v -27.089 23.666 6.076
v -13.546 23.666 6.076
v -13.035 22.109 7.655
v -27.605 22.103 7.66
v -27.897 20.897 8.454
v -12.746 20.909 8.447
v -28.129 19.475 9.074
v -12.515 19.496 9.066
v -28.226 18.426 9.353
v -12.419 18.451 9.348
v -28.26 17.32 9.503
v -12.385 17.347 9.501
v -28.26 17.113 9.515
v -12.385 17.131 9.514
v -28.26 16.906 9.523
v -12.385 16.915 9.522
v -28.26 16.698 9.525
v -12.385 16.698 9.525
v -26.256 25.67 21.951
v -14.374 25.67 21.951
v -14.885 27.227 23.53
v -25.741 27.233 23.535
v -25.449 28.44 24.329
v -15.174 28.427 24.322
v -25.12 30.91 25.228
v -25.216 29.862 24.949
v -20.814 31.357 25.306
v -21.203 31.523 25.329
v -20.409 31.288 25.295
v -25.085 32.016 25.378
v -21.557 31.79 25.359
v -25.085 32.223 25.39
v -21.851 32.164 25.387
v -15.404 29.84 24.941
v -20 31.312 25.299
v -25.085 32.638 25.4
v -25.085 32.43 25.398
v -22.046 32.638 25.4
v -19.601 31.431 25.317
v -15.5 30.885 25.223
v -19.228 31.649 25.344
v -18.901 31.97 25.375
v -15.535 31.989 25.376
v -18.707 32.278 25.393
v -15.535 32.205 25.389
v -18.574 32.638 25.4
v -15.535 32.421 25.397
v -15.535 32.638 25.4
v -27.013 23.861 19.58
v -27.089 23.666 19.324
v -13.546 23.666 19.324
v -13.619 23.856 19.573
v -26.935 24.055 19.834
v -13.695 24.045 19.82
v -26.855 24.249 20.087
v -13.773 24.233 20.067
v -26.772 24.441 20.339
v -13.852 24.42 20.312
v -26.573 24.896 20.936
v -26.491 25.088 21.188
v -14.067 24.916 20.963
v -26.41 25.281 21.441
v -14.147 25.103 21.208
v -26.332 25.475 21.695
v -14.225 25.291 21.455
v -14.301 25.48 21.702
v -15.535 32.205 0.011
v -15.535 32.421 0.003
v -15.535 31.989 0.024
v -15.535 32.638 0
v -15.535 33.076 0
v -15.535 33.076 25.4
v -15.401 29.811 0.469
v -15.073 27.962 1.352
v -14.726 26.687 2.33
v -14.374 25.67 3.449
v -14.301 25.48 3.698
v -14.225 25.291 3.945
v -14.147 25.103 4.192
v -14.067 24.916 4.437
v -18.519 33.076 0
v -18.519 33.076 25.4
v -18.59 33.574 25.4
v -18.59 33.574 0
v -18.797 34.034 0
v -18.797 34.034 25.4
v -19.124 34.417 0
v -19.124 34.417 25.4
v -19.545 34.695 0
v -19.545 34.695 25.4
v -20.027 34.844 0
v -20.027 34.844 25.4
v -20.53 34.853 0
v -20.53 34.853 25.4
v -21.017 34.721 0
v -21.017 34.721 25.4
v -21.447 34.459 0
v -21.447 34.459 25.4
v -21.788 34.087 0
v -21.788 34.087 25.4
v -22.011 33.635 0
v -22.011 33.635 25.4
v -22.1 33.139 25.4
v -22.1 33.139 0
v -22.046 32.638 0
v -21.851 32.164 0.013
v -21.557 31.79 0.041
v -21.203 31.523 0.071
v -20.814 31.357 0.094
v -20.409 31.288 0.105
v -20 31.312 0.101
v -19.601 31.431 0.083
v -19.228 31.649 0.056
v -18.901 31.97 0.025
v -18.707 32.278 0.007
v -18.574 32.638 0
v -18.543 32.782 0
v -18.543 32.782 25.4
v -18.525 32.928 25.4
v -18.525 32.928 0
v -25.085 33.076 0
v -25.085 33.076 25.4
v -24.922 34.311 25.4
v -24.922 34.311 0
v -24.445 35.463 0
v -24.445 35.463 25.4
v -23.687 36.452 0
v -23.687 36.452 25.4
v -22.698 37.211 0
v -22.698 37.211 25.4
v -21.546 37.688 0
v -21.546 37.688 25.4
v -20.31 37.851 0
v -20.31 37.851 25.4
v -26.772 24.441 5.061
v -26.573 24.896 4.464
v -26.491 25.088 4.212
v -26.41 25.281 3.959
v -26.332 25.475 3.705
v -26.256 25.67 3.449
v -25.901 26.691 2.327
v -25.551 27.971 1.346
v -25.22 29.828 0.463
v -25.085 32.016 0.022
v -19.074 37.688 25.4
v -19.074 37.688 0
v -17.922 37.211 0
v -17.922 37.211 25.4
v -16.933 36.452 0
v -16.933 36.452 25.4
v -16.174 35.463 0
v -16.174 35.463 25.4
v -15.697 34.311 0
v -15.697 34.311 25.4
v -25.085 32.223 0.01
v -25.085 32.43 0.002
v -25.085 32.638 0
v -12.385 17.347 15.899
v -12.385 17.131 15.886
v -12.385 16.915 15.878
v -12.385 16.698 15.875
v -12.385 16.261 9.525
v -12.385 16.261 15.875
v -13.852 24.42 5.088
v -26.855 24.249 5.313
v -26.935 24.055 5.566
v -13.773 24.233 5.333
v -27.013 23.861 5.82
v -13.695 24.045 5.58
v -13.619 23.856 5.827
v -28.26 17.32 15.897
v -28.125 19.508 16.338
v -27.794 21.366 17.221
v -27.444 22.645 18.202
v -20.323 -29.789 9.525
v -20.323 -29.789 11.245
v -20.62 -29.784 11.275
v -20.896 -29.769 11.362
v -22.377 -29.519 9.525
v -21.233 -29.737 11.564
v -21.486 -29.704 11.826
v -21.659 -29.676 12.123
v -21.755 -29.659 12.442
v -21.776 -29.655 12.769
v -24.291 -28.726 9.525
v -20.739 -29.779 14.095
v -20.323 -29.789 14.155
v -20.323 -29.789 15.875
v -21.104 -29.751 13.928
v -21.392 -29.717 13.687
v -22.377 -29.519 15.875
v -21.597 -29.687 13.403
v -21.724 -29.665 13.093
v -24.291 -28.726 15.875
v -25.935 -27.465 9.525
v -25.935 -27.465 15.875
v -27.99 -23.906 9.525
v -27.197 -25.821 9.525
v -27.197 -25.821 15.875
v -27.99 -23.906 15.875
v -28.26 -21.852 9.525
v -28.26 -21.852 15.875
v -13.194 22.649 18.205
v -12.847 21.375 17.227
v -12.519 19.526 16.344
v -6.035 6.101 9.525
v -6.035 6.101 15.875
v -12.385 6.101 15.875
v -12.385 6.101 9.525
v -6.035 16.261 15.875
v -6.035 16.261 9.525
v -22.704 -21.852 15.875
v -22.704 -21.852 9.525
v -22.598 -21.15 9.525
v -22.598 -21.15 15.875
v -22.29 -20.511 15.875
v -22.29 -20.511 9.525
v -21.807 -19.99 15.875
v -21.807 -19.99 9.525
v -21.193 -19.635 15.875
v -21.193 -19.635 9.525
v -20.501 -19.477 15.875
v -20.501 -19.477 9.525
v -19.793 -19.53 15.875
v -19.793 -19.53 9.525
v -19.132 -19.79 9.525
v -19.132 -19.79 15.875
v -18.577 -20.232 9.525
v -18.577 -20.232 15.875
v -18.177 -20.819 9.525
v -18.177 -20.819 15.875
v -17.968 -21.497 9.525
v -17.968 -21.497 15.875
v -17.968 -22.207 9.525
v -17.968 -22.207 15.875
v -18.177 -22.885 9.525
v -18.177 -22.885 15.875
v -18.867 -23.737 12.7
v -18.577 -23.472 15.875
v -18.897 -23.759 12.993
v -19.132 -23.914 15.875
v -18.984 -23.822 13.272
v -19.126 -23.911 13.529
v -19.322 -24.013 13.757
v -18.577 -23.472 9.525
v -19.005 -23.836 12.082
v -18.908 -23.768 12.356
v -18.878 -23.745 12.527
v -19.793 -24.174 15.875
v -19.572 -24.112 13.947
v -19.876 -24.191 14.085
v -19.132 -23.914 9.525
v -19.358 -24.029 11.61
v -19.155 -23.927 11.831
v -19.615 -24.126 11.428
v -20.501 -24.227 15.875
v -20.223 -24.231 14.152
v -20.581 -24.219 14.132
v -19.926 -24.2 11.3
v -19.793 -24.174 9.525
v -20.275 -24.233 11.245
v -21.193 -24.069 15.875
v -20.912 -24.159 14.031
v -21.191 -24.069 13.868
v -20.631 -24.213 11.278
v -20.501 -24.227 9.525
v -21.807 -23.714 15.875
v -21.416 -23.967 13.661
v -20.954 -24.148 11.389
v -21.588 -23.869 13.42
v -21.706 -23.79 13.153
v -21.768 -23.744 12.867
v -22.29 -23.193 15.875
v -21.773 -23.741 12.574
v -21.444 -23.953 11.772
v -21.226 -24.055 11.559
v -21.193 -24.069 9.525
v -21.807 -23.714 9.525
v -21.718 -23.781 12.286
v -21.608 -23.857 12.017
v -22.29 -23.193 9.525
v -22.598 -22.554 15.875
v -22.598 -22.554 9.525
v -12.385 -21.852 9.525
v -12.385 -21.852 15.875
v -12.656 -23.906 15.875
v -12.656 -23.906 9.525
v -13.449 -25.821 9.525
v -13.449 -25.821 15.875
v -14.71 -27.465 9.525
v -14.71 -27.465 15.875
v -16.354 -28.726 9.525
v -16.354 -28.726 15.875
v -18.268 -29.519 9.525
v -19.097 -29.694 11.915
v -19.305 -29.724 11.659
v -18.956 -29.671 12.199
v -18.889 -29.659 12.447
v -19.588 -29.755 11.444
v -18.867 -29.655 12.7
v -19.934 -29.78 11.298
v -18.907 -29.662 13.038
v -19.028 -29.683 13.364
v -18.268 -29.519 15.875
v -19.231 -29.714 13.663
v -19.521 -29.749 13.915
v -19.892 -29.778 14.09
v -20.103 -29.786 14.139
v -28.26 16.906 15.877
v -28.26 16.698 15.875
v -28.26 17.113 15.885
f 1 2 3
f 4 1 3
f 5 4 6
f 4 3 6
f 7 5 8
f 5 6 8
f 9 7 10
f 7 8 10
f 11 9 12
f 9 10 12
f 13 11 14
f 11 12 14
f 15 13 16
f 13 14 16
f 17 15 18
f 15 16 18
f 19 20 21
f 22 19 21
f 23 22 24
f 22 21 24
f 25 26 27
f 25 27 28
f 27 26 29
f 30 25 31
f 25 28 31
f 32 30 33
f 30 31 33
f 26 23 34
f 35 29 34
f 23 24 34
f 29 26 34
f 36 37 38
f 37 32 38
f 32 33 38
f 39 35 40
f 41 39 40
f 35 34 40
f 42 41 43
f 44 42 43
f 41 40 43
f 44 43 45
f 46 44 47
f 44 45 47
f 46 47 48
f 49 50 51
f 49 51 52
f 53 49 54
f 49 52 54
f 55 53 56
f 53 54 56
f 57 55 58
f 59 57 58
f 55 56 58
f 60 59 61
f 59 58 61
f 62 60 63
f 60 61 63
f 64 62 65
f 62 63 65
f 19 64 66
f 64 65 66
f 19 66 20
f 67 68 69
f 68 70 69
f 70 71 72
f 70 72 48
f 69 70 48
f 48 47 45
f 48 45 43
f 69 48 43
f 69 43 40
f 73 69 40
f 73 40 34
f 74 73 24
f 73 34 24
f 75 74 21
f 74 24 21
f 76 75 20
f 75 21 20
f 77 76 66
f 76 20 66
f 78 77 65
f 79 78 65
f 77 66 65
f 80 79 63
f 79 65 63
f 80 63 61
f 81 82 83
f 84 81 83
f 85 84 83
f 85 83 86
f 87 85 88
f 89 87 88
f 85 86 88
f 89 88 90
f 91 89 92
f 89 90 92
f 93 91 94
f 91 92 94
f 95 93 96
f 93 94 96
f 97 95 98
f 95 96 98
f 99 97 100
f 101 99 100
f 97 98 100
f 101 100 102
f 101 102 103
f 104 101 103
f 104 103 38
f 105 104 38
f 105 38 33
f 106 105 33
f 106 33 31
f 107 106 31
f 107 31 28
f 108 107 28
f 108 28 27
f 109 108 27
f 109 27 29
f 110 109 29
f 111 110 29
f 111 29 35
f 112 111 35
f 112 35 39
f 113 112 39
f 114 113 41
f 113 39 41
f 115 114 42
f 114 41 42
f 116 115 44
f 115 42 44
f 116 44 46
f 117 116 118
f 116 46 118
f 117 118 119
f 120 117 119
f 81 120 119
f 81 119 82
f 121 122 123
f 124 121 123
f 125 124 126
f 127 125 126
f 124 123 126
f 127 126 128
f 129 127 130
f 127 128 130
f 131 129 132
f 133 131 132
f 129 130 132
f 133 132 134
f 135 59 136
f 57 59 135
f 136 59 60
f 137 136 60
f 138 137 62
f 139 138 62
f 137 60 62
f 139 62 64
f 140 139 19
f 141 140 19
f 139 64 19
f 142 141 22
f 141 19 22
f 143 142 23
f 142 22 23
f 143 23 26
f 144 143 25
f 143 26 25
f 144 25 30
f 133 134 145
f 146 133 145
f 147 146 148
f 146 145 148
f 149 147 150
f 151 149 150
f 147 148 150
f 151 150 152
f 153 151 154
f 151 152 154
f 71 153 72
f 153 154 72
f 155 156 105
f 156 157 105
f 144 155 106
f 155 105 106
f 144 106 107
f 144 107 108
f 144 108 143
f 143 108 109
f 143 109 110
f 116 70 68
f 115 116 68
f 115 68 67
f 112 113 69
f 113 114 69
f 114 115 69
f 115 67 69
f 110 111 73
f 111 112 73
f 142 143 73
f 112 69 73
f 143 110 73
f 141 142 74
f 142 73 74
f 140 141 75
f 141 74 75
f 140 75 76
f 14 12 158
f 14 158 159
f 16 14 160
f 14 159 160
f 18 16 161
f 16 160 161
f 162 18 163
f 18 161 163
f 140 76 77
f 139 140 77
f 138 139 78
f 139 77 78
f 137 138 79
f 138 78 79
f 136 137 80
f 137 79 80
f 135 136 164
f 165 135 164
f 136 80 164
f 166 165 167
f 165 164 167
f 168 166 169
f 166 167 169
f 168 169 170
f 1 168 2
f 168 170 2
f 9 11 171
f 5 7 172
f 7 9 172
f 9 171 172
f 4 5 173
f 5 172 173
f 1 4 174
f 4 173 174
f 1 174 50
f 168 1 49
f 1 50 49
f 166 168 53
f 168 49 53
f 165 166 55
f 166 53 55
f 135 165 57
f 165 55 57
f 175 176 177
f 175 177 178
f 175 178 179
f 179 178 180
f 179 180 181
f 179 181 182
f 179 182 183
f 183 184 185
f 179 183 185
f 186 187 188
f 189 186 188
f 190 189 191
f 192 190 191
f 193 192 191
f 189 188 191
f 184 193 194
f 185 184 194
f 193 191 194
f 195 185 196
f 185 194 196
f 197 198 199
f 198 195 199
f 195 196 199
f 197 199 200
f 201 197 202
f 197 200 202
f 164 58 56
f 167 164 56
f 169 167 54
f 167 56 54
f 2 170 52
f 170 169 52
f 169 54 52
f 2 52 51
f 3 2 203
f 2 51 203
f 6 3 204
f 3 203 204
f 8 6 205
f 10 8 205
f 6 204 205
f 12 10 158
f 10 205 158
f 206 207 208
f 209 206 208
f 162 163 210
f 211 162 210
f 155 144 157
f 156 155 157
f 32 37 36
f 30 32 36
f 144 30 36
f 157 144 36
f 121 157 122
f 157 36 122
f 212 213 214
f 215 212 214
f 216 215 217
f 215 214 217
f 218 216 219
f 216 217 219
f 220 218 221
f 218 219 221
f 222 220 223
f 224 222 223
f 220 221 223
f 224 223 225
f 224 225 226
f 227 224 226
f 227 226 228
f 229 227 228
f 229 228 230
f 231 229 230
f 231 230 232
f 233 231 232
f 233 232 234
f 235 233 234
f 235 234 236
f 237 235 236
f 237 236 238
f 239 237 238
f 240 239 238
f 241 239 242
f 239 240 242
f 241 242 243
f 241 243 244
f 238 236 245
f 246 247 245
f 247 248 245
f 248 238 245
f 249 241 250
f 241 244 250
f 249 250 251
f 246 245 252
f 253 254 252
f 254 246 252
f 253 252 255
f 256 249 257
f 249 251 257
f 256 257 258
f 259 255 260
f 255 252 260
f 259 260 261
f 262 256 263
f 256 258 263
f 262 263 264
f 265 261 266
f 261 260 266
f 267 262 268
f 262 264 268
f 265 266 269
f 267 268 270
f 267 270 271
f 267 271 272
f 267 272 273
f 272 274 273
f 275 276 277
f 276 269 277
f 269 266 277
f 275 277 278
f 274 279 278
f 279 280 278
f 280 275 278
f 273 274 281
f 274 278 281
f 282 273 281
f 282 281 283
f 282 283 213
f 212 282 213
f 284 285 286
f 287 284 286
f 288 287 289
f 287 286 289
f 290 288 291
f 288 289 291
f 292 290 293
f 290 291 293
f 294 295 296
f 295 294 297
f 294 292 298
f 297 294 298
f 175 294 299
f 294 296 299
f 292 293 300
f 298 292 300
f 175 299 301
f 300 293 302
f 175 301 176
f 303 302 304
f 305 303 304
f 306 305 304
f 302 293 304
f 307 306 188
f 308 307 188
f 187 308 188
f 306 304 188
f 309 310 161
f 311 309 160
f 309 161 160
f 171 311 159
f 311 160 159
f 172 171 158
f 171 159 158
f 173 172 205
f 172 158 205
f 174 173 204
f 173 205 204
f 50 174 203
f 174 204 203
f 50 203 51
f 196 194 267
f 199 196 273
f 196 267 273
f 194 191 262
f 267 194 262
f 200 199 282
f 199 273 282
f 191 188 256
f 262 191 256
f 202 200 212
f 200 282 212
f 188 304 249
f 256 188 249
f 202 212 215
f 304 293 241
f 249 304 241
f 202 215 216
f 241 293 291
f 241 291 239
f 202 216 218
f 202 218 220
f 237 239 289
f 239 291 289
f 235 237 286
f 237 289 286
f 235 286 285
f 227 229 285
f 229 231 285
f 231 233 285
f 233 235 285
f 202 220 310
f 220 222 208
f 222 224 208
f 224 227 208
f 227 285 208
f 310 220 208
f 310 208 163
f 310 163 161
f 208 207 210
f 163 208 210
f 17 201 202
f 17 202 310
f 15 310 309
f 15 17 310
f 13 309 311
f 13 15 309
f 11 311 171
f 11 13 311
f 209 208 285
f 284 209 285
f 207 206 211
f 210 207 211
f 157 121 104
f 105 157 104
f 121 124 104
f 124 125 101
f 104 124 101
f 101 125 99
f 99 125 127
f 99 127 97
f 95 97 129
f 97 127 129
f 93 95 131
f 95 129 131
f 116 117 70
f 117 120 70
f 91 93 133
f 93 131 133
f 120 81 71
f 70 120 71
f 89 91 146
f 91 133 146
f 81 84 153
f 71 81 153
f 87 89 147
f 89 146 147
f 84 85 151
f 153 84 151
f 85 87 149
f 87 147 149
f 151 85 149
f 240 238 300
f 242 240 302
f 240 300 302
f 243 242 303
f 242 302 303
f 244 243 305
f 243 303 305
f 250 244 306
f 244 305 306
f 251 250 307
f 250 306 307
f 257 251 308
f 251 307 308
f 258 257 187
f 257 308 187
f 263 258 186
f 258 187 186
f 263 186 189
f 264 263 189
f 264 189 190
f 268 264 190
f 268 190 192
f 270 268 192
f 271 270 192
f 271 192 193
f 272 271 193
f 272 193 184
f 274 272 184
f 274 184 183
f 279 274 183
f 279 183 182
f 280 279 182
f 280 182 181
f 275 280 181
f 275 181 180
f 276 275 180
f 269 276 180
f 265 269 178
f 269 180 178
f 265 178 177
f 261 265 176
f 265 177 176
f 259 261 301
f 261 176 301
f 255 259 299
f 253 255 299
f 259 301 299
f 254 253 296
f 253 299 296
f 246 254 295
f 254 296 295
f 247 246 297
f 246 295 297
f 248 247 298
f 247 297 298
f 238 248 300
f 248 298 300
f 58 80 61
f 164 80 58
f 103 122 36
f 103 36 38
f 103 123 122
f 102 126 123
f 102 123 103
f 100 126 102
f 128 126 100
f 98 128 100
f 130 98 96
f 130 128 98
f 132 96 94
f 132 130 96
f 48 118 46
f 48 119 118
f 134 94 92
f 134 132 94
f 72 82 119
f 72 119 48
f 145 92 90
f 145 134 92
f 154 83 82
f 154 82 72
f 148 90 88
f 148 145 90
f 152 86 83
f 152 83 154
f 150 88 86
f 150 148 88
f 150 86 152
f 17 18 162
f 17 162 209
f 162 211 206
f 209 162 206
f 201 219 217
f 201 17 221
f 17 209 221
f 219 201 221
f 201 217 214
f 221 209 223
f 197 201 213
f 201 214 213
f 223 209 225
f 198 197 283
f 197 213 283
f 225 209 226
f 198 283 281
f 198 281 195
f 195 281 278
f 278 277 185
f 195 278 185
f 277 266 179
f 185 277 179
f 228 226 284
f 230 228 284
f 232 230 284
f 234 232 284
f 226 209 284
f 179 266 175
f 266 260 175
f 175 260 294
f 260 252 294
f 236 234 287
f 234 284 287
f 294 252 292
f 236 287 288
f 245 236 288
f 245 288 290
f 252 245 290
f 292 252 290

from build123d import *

# Parameters (mm, degrees)
SKETCH1_W               = 22.225
SKETCH1_H               = 67.6402
BOSS_EXTRUDE1_DEPTH     = 25.4
SKETCH2_R               = 1.7907
CUT_EXTRUDE2_DEPTH      = 25.4
SKETCH4_W               = 9.525
SKETCH4_H               = 10.16
SKETCH4_H_2             = 35.894850391
SKETCH4_H_3             = 35.916644849
CUT_EXTRUDE3_DEPTH      = 51.712797865
SKETCH5_R               = 2.38125
CUT_EXTRUDE4_DEPTH      = 6.35
CUT_EXTRUDE5_REACH      = 79.582
CUT_EXTRUDE5_END_RADIUS = 2.38125
SKETCH6_R               = 1.455475959


with BuildPart() as part:
    # Sketch1 → Boss-Extrude1 (new body)
    with BuildSketch(Plane.XY):
        with Locations((-17.147623967, 4.03062314)):
            Rectangle(SKETCH1_W, SKETCH1_H)
    extrude(amount=BOSS_EXTRUDE1_DEPTH)

    # Sketch2 → Cut-Extrude2 (cut)
    with BuildSketch(Plane.XY.offset(25.4)):
        with BuildLine():
            ThreePointArc((-20.309923967, 37.85072314), (-16.933347665, 36.452099442), (-15.534723967, 33.07552314))
            Line((-15.534723967, 33.07552314), (-15.534723967, 31.988846816))
            ThreePointArc((-15.534723967, 31.988846816), (-15.164047916, 28.377221194), (-14.067475414, 24.916185349))
            Line((-14.067475414, 24.916185349), (-13.85237252, 24.420060932))
            ThreePointArc((-13.85237252, 24.420060932), (-12.755800018, 20.959025087), (-12.385123967, 17.347399465))
            Line((-12.385123967, 17.347399465), (-12.385123967, 16.26072314))
            Line((-12.385123967, 16.26072314), (-6.035123967, 16.26072314))
            Line((-6.035123967, 16.26072314), (-6.035123967, 37.85072314))
            Line((-6.035123967, 37.85072314), (-20.309923967, 37.85072314))
        make_face()
        with BuildLine():
            Line((-25.085123967, 32.016111722), (-25.085123967, 33.07552314))
            ThreePointArc((-25.085123967, 33.07552314), (-23.686500268, 36.452099442), (-20.309923967, 37.85072314))
            Line((-20.309923967, 37.85072314), (-28.260123967, 37.85072314))
            Line((-28.260123967, 37.85072314), (-28.260123967, 17.320134559))
            ThreePointArc((-28.260123967, 17.320134559), (-27.884120973, 20.957343409), (-26.772015056, 24.440716329))
            Line((-26.772015056, 24.440716329), (-26.573232878, 24.895529952))
            ThreePointArc((-26.573232878, 24.895529952), (-25.461126961, 28.378902872), (-25.085123967, 32.016111722))
        make_face()
        with BuildLine():
            Line((-6.035123967, -29.78947686), (-6.035123967, 6.10072314))
            Line((-6.035123967, 6.10072314), (-12.385123967, 6.10072314))
            Line((-12.385123967, 6.10072314), (-12.385123967, -21.85197686))
            ThreePointArc((-12.385123967, -21.85197686), (-14.709963891, -27.464636935), (-20.322623967, -29.78947686))
            Line((-20.322623967, -29.78947686), (-6.035123967, -29.78947686))
        make_face()
        with BuildLine():
            ThreePointArc((-20.322623967, -29.78947686), (-25.935284043, -27.464636935), (-28.260123967, -21.85197686))
            Line((-28.260123967, -21.85197686), (-28.260123967, -29.78947686))
            Line((-28.260123967, -29.78947686), (-20.322623967, -29.78947686))
        make_face()
        with Locations((-20.309923967, 33.07552314)):
            Circle(SKETCH2_R)
    extrude(amount=-CUT_EXTRUDE2_DEPTH, mode=Mode.SUBTRACT)

    # Sketch4 → Cut-Extrude3 (cut, through all)
    with BuildSketch(Plane(origin=(-6.035123967, 0, 0), x_dir=(0, 0, -1), z_dir=(1, 0, 0))):
        with BuildLine():
            Line((-9.525, 16.698464592), (-9.525, 16.26072314))
            Line((-9.525, 16.26072314), (0, 16.26072314))
            Line((0, 16.26072314), (0, 32.637781689))
            ThreePointArc((0, 32.637781689), (-0.909409772, 28.750457477), (-3.448884978, 25.669973531))
            Line((-3.448884978, 25.669973531), (-6.076115022, 23.66627275))
            ThreePointArc((-6.076115022, 23.66627275), (-8.615590228, 20.585788804), (-9.525, 16.698464592))
        make_face()
        with Locations((-4.7625, 11.18072314)):
            Rectangle(SKETCH4_W, SKETCH4_H)
        with Locations((-4.7625, -11.846702056)):
            Rectangle(SKETCH4_W, SKETCH4_H_2)
        with Locations((-20.6375, -11.857599285)):
            Rectangle(SKETCH4_W, SKETCH4_H_3)
        with Locations((-20.6375, 11.18072314)):
            Rectangle(SKETCH4_W, SKETCH4_H)
        with BuildLine():
            Line((-25.4, 16.26072314), (-15.875, 16.26072314))
            Line((-15.875, 16.26072314), (-15.875, 16.698464592))
            ThreePointArc((-15.875, 16.698464592), (-16.784409772, 20.585788804), (-19.323884978, 23.66627275))
            Line((-19.323884978, 23.66627275), (-21.951115022, 25.669973531))
            ThreePointArc((-21.951115022, 25.669973531), (-24.490590228, 28.750457477), (-25.4, 32.637781689))
            Line((-25.4, 32.637781689), (-25.4, 16.26072314))
        make_face()
    extrude(amount=-CUT_EXTRUDE3_DEPTH, mode=Mode.SUBTRACT)

    # Sketch5 → Cut-Extrude4 (cut)
    with BuildSketch(Plane(origin=(0, 0, 9.525), x_dir=(-1, 0, 0), z_dir=(0, 0, -1))):
        with Locations((20.322623967, -21.85197686)):
            Circle(SKETCH5_R)
    extrude(amount=-CUT_EXTRUDE4_DEPTH, mode=Mode.SUBTRACT)

    # Cut-Extrude5: up to this cylinder (the profile starts outside it)
    cut_extrude5_end = Plane(origin=(-20.322623967, -21.85197686, 12.7), z_dir=(0, 0, -1)) * Cylinder(CUT_EXTRUDE5_END_RADIUS, 164.9265, mode=Mode.PRIVATE)
    # Sketch6 → Cut-Extrude5 (cut, up to the surface)
    with BuildSketch(Plane.XZ.offset(29.78947686), mode=Mode.PRIVATE) as cut_extrude5_sk1:
        with Locations((-20.322623967, 12.7)):
            Circle(SKETCH6_R)
    cut_extrude5_tool1 = extrude(cut_extrude5_sk1.sketch, amount=-CUT_EXTRUDE5_REACH, mode=Mode.PRIVATE) - cut_extrude5_end
    add(cut_extrude5_tool1.solids().sort_by_distance((-20.322624, -29.789477, 12.7))[0], mode=Mode.SUBTRACT)


solid = part.part
